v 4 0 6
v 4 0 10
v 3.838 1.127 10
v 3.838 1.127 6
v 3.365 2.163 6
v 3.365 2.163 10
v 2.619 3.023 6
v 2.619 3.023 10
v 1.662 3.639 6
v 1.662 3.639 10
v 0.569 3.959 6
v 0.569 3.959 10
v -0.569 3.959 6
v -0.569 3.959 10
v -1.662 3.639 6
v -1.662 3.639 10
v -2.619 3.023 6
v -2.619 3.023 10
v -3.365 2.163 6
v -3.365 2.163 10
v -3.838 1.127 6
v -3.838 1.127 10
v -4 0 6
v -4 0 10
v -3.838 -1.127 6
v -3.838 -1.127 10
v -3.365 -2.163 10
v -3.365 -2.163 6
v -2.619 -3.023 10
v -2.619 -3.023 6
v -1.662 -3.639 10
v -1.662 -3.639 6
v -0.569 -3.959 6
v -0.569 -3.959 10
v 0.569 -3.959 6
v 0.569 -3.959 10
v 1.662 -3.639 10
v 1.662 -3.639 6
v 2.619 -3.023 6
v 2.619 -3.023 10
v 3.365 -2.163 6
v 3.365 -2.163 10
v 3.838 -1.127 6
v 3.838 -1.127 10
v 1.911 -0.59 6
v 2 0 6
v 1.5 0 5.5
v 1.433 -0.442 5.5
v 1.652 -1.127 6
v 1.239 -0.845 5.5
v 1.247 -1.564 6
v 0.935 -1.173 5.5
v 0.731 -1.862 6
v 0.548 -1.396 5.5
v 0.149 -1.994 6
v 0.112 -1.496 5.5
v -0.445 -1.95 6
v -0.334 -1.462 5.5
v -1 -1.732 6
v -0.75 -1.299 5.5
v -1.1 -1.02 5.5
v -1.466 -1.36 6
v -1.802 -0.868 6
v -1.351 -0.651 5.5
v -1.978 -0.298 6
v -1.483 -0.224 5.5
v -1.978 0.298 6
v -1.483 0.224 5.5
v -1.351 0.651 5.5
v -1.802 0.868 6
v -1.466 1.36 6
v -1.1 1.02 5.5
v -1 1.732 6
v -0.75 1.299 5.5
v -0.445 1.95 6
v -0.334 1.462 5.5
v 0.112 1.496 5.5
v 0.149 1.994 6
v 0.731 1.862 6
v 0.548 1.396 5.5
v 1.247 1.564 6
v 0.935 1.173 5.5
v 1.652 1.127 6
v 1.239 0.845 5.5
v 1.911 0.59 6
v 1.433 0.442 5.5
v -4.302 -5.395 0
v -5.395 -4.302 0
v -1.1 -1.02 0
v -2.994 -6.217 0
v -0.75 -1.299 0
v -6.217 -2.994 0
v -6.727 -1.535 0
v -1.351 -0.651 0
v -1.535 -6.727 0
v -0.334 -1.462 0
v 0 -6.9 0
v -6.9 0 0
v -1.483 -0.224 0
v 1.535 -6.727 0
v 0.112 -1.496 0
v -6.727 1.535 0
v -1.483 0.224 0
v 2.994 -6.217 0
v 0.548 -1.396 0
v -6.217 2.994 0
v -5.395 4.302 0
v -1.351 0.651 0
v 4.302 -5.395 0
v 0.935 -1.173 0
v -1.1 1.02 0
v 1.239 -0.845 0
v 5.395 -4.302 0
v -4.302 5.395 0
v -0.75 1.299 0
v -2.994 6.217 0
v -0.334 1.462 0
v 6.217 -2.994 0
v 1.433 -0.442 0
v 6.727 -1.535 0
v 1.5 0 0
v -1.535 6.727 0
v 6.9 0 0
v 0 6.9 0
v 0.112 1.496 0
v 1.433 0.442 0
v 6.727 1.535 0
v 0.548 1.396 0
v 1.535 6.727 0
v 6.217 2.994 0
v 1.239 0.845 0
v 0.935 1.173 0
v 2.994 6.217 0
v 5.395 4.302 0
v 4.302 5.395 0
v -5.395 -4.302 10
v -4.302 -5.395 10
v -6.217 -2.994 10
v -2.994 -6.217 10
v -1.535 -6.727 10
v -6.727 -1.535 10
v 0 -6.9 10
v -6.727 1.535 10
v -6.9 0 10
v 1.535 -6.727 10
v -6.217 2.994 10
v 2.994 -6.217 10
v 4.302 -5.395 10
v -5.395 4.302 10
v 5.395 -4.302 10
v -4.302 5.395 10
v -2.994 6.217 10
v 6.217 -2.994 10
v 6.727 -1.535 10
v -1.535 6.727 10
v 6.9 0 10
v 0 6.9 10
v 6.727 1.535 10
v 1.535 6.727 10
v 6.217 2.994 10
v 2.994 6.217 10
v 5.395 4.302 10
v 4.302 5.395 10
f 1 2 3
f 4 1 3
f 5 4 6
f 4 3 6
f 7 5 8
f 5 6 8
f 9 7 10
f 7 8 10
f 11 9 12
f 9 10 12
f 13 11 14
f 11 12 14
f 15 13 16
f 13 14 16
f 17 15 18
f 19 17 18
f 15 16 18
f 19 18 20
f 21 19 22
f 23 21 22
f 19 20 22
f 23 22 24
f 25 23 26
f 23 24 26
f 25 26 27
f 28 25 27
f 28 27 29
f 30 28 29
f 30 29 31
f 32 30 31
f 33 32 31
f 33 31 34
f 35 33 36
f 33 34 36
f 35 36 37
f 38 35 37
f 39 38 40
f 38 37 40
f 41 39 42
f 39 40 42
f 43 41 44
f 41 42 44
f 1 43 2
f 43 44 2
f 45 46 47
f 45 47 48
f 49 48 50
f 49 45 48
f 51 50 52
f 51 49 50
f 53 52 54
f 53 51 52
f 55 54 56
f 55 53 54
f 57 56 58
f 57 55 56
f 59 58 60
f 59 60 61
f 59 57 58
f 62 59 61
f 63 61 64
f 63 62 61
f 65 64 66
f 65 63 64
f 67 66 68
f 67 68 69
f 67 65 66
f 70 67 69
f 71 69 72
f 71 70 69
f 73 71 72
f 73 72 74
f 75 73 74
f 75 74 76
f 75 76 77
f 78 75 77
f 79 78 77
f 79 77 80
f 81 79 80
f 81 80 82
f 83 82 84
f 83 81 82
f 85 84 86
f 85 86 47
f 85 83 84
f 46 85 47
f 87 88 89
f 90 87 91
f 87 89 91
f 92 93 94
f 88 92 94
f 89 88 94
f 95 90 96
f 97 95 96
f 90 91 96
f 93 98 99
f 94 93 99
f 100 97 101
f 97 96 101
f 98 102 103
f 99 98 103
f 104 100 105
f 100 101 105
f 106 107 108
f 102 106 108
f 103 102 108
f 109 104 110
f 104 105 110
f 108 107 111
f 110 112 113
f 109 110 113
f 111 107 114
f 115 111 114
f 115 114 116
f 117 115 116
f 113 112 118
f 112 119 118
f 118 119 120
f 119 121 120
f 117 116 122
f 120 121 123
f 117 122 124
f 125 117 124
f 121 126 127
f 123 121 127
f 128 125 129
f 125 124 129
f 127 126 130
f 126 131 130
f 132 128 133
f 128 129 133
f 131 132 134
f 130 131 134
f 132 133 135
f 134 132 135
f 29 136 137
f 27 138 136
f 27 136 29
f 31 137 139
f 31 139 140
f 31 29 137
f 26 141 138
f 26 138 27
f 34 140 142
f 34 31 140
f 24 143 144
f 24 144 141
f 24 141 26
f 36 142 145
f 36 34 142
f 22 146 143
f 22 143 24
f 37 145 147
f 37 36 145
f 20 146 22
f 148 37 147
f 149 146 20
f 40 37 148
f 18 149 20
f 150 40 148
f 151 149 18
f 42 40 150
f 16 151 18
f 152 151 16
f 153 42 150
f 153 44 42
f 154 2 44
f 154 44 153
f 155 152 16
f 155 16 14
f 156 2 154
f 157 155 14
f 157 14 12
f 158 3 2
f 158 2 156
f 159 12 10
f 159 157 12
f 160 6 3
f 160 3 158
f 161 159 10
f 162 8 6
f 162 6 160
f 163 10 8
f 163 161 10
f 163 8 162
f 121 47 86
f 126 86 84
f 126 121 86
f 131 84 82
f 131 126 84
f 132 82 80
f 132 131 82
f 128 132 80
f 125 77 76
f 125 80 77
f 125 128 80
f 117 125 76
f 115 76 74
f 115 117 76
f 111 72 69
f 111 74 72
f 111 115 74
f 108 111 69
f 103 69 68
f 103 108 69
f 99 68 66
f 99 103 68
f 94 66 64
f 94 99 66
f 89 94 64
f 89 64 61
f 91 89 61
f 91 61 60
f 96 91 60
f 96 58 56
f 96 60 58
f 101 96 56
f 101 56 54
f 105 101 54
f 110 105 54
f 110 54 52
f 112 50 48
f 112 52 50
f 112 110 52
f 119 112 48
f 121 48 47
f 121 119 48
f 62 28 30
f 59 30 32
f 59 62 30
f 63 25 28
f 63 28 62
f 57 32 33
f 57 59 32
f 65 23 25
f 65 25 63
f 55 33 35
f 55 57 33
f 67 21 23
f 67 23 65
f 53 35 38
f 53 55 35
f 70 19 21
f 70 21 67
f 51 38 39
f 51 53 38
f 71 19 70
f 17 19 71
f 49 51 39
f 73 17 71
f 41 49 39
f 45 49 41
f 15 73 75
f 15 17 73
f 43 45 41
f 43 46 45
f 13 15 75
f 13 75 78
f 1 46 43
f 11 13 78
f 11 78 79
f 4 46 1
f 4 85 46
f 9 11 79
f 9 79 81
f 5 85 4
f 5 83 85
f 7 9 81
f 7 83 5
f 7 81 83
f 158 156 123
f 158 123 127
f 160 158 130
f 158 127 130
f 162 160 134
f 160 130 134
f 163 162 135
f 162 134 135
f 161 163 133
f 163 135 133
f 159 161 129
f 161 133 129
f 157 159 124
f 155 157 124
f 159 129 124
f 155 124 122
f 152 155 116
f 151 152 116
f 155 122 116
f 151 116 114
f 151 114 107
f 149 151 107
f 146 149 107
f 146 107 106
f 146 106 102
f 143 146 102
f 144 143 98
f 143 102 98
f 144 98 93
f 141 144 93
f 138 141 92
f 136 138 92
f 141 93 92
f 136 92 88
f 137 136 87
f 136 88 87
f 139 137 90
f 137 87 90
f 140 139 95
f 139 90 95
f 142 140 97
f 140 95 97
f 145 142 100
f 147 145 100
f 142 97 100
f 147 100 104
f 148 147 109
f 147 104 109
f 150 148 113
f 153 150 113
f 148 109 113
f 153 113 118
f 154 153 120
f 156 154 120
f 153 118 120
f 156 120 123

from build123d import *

# Parameters (mm, degrees)
F0_R     = 6.9
F0_R_2   = 1.5
F1_DEPTH = 10
F2_R     = 4
F3_DEPTH = 4
F4_SIZE  = 0.5


with BuildPart() as f1:
    # F0 (on Top) → F1 (new body)
    with BuildSketch(Plane.XY):
        Circle(F0_R)
        Circle(F0_R_2, mode=Mode.SUBTRACT)
    extrude(amount=F1_DEPTH)

    # F2 (on face) → F3 (cut)
    with BuildSketch(Plane.XY.offset(10)):
        Circle(F2_R)
    extrude(amount=-F3_DEPTH, mode=Mode.SUBTRACT)

    # F4
    f4_edges = [f1.edges().sort_by_distance(p)[0] for p in [
        (-1.5, 0, 6),
    ]]
    chamfer(f4_edges, length=F4_SIZE)


solid = f1.part
